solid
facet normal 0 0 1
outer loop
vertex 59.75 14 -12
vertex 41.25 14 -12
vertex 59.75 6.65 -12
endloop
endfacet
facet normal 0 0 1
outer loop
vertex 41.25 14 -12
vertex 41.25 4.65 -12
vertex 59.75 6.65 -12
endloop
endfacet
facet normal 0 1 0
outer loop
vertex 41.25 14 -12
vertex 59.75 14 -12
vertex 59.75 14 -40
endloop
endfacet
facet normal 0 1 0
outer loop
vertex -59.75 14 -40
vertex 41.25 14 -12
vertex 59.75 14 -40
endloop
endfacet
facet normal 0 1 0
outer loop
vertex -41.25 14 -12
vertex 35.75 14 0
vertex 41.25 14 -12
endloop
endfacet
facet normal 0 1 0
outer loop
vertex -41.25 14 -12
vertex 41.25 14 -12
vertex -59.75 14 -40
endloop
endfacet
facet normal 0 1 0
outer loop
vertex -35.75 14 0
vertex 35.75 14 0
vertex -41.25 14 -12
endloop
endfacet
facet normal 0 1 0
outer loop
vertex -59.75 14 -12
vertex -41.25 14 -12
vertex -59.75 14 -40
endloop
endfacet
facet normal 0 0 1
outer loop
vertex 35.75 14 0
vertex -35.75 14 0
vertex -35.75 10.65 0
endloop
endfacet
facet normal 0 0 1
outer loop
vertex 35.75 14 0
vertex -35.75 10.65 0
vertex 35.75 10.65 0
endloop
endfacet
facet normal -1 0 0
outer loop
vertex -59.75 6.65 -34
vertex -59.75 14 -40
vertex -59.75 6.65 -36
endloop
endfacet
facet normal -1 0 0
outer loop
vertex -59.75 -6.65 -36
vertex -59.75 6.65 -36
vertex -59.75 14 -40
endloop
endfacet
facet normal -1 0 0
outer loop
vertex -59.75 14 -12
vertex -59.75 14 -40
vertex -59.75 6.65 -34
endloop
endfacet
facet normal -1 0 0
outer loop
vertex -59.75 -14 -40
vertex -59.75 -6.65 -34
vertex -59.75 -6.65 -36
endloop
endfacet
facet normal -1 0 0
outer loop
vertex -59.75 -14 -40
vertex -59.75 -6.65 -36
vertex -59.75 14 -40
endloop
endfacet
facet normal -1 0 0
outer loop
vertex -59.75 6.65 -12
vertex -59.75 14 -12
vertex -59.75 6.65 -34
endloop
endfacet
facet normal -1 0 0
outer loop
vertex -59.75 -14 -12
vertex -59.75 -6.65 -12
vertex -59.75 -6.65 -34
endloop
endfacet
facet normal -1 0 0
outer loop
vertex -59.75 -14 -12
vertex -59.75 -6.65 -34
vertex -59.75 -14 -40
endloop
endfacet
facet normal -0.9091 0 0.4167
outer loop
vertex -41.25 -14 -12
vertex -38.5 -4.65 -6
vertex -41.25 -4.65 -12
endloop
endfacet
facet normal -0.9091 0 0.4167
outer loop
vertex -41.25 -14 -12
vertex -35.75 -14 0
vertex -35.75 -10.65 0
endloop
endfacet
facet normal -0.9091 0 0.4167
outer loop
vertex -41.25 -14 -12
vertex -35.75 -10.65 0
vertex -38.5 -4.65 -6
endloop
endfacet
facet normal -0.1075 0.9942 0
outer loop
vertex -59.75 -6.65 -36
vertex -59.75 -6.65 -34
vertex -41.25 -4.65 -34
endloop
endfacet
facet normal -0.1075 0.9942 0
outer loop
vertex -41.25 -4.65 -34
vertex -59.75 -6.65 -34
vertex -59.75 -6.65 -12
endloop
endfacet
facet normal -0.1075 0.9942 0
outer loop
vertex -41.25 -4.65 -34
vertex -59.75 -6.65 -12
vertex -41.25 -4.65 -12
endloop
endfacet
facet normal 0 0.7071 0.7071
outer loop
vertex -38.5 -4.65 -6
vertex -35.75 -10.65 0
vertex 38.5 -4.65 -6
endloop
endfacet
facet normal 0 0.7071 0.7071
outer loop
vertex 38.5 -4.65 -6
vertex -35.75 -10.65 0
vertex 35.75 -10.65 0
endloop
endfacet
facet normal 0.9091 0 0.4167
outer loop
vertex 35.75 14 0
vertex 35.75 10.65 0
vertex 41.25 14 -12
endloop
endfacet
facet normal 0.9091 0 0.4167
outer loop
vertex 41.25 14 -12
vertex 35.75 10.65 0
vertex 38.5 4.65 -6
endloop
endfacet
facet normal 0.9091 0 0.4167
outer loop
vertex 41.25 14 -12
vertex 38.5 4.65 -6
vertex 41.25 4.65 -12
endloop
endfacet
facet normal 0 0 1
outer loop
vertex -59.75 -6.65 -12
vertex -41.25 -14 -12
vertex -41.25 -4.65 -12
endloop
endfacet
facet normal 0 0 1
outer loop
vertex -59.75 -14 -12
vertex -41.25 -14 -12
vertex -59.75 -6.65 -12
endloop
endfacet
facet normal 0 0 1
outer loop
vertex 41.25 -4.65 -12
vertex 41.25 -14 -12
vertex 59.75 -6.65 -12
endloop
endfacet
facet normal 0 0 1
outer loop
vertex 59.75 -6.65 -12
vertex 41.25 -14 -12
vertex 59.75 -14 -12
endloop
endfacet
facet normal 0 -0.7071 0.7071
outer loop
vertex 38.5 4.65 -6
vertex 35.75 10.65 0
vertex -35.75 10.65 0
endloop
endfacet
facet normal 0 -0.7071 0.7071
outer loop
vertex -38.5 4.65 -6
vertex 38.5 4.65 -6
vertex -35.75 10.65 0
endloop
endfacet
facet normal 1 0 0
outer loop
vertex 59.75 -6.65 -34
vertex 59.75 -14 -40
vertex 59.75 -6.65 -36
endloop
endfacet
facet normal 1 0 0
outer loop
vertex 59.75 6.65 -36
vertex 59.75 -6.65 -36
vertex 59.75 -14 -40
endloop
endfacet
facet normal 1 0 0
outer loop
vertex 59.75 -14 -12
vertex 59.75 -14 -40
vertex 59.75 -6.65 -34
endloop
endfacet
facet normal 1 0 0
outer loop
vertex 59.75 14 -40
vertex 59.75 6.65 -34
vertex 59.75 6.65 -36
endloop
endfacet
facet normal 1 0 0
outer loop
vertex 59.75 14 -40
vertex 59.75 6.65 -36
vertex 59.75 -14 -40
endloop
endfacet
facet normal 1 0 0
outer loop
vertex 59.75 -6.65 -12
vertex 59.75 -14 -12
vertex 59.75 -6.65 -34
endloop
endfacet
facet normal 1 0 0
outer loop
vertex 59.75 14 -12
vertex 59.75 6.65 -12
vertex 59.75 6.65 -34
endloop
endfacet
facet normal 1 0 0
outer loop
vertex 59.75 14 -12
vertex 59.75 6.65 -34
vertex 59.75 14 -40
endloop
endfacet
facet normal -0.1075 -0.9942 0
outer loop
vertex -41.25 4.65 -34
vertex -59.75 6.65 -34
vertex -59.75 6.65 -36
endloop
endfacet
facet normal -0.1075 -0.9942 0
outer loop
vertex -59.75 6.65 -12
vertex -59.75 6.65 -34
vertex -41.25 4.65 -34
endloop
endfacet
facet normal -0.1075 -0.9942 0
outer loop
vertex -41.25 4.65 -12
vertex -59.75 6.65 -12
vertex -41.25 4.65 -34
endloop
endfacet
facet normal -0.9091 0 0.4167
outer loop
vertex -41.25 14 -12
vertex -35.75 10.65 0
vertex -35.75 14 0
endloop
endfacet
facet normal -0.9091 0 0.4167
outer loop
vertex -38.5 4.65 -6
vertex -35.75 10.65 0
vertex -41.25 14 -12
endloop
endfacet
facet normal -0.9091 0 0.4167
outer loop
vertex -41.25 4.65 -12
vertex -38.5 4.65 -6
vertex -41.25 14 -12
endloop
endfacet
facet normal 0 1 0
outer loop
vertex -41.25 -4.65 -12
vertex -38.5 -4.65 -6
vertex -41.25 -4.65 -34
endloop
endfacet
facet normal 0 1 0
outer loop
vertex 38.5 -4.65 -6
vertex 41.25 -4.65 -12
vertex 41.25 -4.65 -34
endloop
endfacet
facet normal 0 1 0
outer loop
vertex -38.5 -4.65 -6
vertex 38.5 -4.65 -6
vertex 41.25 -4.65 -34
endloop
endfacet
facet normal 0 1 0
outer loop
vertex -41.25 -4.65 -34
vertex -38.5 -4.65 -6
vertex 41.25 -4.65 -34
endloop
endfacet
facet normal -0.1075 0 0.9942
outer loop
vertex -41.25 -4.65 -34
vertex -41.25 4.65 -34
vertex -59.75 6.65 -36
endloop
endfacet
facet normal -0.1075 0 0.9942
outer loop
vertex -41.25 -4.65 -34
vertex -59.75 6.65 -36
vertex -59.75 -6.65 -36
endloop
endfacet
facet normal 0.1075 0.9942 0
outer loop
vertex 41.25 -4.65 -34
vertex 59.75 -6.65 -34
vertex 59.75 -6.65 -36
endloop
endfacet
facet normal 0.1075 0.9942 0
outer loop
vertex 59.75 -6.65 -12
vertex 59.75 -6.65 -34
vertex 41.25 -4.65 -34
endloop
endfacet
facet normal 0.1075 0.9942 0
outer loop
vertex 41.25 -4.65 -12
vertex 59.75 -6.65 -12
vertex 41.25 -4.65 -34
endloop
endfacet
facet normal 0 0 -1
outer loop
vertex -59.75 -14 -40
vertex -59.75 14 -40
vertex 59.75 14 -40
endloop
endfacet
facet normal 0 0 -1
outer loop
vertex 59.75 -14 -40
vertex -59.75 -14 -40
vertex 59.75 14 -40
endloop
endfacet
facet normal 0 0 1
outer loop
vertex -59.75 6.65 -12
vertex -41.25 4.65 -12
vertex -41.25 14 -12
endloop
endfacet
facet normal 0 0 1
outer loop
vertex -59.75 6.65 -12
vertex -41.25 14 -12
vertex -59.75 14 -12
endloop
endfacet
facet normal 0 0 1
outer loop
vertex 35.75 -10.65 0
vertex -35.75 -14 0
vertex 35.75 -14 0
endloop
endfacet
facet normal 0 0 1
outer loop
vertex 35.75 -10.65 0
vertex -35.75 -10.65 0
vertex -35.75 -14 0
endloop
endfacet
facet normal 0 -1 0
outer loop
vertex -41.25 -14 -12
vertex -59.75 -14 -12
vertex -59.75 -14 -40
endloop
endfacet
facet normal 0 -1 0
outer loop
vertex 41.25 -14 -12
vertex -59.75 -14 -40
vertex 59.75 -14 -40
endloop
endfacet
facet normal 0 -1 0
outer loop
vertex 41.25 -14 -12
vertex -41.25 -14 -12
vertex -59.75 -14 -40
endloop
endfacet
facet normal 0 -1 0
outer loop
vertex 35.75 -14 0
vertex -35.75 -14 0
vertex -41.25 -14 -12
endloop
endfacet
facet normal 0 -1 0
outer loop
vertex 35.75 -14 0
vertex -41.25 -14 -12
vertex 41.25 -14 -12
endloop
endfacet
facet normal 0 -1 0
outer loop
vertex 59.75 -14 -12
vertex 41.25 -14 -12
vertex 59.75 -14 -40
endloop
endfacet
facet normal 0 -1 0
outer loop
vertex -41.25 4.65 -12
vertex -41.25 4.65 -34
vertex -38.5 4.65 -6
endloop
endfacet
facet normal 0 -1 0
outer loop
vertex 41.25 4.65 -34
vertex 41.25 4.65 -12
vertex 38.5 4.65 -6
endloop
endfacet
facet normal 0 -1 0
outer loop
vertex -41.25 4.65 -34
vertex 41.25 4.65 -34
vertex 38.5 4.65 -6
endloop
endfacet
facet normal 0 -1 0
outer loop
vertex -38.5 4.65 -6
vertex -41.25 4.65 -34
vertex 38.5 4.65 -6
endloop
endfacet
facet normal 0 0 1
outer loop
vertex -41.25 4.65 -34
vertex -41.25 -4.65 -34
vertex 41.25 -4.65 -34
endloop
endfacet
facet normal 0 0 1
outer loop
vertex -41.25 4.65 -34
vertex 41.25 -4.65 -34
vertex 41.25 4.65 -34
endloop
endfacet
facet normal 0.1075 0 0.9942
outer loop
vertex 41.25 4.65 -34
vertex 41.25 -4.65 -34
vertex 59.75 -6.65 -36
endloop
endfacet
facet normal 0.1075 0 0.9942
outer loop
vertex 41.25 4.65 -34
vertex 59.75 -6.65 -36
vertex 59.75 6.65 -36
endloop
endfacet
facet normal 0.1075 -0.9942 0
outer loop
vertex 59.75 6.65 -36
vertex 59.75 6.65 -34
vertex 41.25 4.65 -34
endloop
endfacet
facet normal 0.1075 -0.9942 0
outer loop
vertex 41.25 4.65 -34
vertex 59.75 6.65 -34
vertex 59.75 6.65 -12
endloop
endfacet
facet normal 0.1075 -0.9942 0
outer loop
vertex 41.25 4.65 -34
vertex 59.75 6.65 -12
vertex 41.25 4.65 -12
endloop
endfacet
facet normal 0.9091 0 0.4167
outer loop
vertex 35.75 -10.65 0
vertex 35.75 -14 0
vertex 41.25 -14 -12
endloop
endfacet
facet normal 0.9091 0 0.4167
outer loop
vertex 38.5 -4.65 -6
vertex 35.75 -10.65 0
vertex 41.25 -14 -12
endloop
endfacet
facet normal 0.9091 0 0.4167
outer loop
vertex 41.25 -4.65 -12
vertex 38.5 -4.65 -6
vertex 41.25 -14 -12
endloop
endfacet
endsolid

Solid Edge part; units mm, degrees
sketch "Sketch1" plane through (0, 0, 0) normal (0, 0, 1) x (1, 0, 0)
  line L0 (-59.75, -14) -> (59.75, -14)
  line L1 (59.75, -14) -> (59.75, 14)
  line L2 (59.75, 14) -> (-59.75, 14)
  line L3 (-59.75, 14) -> (-59.75, -14)
extrude "Protrusion1" add sketch "Sketch1" against normal blind 40
sketch "Sketch2" plane through (0, -14, -20) normal (0, -1, 0) x (1, 0, 0)
  line L0 (-59.75, 20) -> (-41.25, 20)
  line L1 (-41.25, 20) -> (-41.25, 8)
  line L2 (-41.25, 8) -> (-59.75, 8)
  line L3 (-59.75, 8) -> (-59.75, 20)
extrude "ExtrudedCutout_1" cut sketch "Sketch2" against normal blind 28
sketch "Sketch3" plane through (0, -14, -20) normal (0, -1, 0) x (1, 0, 0)
  line L0 (59.75, 20) -> (41.25, 20)
  line L1 (41.25, 20) -> (41.25, 8)
  line L2 (41.25, 8) -> (59.75, 8)
  line L3 (59.75, 8) -> (59.75, 20)
extrude "ExtrudedCutout_2" cut sketch "Sketch3" against normal blind 28
sketch "Sketch4" plane through (0, -14, -20) normal (0, -1, 0) x (1, 0, 0)
  line L0 (41.25, 20) -> (35.75, 20)
  line L1 (35.75, 20) -> (41.25, 8)
  line L2 (41.25, 8) -> (41.25, 20)
extrude "ExtrudedCutout_3" cut sketch "Sketch4" against normal blind 28
sketch "Sketch5" plane through (0, -14, -20) normal (0, -1, 0) x (1, 0, 0)
  line L0 (-41.25, 20) -> (-35.75, 20)
  line L1 (-35.75, 20) -> (-41.25, 8)
  line L2 (-41.25, 8) -> (-41.25, 20)
extrude "ExtrudedCutout_4" cut sketch "Sketch5" against normal blind 28
sketch "Sketch6" plane through (59.75, 0, -26) normal (1, 0, 0) x (0, 1, 0)
  line L0 (-4.65, 26) -> (-4.65, -8)
  line L1 (-4.65, -8) -> (4.65, -8)
  line L2 (4.65, -8) -> (4.65, 26)
  line L3 (4.65, 26) -> (-4.65, 26)
extrude "ExtrudedCutout_5" cut sketch "Sketch6" against normal blind 119.5
chamfer "Chamfer_1" distance 6 angle 45 1 edges at (0, 4.65, 0)
chamfer "Chamfer_2" distance 6 angle 45 1 edges at (0, -4.65, 0)
sketch "Sketch7" plane through (50.5, 9.325, -12) normal (0, 0, 1) x (0, 1, 0)
  line L0 (-4.675, -9.25) -> (-2.675, -9.25)
  line L1 (-2.675, -9.25) -> (-4.675, 9.25)
  line L2 (-4.675, 9.25) -> (-4.675, -9.25)
extrude "ExtrudedCutout_6" cut sketch "Sketch7" against normal blind 22
sketch "Sketch8" plane through (50.5, -9.325, -12) normal (0, 0, 1) x (0, 1, 0)
  line L0 (4.675, -9.25) -> (2.675, -9.25)
  line L1 (2.675, -9.25) -> (4.675, 9.25)
  line L2 (4.675, 9.25) -> (4.675, -9.25)
extrude "ExtrudedCutout_7" cut sketch "Sketch8" against normal blind 22
sketch "Sketch9" plane through (-50.5, -9.325, -12) normal (0, 0, 1) x (0, 1, 0)
  line L0 (4.675, 9.25) -> (2.675, 9.25)
  line L1 (2.675, 9.25) -> (4.675, -9.25)
  line L2 (4.675, -9.25) -> (4.675, 9.25)
extrude "ExtrudedCutout_8" cut sketch "Sketch9" against normal blind 22
sketch "Sketch10" plane through (-50.5, 9.325, -12) normal (0, 0, 1) x (0, 1, 0)
  line L0 (-4.675, 9.25) -> (-2.675, 9.25)
  line L1 (-2.675, 9.25) -> (-4.675, -9.25)
  line L2 (-4.675, -9.25) -> (-4.675, 9.25)
extrude "ExtrudedCutout_9" cut sketch "Sketch10" against normal blind 22
chamfer "Chamfer_5" distance 18.5 distance2 2 1 edges at (59.75, 0, -34) measured on face at (-38.6383, -4.5663, -34)
chamfer "Chamfer_6" distance 18.5 distance2 2 1 edges at (-59.75, 0, -34) measured on face at (-41.9067, -4.5663, -34)
